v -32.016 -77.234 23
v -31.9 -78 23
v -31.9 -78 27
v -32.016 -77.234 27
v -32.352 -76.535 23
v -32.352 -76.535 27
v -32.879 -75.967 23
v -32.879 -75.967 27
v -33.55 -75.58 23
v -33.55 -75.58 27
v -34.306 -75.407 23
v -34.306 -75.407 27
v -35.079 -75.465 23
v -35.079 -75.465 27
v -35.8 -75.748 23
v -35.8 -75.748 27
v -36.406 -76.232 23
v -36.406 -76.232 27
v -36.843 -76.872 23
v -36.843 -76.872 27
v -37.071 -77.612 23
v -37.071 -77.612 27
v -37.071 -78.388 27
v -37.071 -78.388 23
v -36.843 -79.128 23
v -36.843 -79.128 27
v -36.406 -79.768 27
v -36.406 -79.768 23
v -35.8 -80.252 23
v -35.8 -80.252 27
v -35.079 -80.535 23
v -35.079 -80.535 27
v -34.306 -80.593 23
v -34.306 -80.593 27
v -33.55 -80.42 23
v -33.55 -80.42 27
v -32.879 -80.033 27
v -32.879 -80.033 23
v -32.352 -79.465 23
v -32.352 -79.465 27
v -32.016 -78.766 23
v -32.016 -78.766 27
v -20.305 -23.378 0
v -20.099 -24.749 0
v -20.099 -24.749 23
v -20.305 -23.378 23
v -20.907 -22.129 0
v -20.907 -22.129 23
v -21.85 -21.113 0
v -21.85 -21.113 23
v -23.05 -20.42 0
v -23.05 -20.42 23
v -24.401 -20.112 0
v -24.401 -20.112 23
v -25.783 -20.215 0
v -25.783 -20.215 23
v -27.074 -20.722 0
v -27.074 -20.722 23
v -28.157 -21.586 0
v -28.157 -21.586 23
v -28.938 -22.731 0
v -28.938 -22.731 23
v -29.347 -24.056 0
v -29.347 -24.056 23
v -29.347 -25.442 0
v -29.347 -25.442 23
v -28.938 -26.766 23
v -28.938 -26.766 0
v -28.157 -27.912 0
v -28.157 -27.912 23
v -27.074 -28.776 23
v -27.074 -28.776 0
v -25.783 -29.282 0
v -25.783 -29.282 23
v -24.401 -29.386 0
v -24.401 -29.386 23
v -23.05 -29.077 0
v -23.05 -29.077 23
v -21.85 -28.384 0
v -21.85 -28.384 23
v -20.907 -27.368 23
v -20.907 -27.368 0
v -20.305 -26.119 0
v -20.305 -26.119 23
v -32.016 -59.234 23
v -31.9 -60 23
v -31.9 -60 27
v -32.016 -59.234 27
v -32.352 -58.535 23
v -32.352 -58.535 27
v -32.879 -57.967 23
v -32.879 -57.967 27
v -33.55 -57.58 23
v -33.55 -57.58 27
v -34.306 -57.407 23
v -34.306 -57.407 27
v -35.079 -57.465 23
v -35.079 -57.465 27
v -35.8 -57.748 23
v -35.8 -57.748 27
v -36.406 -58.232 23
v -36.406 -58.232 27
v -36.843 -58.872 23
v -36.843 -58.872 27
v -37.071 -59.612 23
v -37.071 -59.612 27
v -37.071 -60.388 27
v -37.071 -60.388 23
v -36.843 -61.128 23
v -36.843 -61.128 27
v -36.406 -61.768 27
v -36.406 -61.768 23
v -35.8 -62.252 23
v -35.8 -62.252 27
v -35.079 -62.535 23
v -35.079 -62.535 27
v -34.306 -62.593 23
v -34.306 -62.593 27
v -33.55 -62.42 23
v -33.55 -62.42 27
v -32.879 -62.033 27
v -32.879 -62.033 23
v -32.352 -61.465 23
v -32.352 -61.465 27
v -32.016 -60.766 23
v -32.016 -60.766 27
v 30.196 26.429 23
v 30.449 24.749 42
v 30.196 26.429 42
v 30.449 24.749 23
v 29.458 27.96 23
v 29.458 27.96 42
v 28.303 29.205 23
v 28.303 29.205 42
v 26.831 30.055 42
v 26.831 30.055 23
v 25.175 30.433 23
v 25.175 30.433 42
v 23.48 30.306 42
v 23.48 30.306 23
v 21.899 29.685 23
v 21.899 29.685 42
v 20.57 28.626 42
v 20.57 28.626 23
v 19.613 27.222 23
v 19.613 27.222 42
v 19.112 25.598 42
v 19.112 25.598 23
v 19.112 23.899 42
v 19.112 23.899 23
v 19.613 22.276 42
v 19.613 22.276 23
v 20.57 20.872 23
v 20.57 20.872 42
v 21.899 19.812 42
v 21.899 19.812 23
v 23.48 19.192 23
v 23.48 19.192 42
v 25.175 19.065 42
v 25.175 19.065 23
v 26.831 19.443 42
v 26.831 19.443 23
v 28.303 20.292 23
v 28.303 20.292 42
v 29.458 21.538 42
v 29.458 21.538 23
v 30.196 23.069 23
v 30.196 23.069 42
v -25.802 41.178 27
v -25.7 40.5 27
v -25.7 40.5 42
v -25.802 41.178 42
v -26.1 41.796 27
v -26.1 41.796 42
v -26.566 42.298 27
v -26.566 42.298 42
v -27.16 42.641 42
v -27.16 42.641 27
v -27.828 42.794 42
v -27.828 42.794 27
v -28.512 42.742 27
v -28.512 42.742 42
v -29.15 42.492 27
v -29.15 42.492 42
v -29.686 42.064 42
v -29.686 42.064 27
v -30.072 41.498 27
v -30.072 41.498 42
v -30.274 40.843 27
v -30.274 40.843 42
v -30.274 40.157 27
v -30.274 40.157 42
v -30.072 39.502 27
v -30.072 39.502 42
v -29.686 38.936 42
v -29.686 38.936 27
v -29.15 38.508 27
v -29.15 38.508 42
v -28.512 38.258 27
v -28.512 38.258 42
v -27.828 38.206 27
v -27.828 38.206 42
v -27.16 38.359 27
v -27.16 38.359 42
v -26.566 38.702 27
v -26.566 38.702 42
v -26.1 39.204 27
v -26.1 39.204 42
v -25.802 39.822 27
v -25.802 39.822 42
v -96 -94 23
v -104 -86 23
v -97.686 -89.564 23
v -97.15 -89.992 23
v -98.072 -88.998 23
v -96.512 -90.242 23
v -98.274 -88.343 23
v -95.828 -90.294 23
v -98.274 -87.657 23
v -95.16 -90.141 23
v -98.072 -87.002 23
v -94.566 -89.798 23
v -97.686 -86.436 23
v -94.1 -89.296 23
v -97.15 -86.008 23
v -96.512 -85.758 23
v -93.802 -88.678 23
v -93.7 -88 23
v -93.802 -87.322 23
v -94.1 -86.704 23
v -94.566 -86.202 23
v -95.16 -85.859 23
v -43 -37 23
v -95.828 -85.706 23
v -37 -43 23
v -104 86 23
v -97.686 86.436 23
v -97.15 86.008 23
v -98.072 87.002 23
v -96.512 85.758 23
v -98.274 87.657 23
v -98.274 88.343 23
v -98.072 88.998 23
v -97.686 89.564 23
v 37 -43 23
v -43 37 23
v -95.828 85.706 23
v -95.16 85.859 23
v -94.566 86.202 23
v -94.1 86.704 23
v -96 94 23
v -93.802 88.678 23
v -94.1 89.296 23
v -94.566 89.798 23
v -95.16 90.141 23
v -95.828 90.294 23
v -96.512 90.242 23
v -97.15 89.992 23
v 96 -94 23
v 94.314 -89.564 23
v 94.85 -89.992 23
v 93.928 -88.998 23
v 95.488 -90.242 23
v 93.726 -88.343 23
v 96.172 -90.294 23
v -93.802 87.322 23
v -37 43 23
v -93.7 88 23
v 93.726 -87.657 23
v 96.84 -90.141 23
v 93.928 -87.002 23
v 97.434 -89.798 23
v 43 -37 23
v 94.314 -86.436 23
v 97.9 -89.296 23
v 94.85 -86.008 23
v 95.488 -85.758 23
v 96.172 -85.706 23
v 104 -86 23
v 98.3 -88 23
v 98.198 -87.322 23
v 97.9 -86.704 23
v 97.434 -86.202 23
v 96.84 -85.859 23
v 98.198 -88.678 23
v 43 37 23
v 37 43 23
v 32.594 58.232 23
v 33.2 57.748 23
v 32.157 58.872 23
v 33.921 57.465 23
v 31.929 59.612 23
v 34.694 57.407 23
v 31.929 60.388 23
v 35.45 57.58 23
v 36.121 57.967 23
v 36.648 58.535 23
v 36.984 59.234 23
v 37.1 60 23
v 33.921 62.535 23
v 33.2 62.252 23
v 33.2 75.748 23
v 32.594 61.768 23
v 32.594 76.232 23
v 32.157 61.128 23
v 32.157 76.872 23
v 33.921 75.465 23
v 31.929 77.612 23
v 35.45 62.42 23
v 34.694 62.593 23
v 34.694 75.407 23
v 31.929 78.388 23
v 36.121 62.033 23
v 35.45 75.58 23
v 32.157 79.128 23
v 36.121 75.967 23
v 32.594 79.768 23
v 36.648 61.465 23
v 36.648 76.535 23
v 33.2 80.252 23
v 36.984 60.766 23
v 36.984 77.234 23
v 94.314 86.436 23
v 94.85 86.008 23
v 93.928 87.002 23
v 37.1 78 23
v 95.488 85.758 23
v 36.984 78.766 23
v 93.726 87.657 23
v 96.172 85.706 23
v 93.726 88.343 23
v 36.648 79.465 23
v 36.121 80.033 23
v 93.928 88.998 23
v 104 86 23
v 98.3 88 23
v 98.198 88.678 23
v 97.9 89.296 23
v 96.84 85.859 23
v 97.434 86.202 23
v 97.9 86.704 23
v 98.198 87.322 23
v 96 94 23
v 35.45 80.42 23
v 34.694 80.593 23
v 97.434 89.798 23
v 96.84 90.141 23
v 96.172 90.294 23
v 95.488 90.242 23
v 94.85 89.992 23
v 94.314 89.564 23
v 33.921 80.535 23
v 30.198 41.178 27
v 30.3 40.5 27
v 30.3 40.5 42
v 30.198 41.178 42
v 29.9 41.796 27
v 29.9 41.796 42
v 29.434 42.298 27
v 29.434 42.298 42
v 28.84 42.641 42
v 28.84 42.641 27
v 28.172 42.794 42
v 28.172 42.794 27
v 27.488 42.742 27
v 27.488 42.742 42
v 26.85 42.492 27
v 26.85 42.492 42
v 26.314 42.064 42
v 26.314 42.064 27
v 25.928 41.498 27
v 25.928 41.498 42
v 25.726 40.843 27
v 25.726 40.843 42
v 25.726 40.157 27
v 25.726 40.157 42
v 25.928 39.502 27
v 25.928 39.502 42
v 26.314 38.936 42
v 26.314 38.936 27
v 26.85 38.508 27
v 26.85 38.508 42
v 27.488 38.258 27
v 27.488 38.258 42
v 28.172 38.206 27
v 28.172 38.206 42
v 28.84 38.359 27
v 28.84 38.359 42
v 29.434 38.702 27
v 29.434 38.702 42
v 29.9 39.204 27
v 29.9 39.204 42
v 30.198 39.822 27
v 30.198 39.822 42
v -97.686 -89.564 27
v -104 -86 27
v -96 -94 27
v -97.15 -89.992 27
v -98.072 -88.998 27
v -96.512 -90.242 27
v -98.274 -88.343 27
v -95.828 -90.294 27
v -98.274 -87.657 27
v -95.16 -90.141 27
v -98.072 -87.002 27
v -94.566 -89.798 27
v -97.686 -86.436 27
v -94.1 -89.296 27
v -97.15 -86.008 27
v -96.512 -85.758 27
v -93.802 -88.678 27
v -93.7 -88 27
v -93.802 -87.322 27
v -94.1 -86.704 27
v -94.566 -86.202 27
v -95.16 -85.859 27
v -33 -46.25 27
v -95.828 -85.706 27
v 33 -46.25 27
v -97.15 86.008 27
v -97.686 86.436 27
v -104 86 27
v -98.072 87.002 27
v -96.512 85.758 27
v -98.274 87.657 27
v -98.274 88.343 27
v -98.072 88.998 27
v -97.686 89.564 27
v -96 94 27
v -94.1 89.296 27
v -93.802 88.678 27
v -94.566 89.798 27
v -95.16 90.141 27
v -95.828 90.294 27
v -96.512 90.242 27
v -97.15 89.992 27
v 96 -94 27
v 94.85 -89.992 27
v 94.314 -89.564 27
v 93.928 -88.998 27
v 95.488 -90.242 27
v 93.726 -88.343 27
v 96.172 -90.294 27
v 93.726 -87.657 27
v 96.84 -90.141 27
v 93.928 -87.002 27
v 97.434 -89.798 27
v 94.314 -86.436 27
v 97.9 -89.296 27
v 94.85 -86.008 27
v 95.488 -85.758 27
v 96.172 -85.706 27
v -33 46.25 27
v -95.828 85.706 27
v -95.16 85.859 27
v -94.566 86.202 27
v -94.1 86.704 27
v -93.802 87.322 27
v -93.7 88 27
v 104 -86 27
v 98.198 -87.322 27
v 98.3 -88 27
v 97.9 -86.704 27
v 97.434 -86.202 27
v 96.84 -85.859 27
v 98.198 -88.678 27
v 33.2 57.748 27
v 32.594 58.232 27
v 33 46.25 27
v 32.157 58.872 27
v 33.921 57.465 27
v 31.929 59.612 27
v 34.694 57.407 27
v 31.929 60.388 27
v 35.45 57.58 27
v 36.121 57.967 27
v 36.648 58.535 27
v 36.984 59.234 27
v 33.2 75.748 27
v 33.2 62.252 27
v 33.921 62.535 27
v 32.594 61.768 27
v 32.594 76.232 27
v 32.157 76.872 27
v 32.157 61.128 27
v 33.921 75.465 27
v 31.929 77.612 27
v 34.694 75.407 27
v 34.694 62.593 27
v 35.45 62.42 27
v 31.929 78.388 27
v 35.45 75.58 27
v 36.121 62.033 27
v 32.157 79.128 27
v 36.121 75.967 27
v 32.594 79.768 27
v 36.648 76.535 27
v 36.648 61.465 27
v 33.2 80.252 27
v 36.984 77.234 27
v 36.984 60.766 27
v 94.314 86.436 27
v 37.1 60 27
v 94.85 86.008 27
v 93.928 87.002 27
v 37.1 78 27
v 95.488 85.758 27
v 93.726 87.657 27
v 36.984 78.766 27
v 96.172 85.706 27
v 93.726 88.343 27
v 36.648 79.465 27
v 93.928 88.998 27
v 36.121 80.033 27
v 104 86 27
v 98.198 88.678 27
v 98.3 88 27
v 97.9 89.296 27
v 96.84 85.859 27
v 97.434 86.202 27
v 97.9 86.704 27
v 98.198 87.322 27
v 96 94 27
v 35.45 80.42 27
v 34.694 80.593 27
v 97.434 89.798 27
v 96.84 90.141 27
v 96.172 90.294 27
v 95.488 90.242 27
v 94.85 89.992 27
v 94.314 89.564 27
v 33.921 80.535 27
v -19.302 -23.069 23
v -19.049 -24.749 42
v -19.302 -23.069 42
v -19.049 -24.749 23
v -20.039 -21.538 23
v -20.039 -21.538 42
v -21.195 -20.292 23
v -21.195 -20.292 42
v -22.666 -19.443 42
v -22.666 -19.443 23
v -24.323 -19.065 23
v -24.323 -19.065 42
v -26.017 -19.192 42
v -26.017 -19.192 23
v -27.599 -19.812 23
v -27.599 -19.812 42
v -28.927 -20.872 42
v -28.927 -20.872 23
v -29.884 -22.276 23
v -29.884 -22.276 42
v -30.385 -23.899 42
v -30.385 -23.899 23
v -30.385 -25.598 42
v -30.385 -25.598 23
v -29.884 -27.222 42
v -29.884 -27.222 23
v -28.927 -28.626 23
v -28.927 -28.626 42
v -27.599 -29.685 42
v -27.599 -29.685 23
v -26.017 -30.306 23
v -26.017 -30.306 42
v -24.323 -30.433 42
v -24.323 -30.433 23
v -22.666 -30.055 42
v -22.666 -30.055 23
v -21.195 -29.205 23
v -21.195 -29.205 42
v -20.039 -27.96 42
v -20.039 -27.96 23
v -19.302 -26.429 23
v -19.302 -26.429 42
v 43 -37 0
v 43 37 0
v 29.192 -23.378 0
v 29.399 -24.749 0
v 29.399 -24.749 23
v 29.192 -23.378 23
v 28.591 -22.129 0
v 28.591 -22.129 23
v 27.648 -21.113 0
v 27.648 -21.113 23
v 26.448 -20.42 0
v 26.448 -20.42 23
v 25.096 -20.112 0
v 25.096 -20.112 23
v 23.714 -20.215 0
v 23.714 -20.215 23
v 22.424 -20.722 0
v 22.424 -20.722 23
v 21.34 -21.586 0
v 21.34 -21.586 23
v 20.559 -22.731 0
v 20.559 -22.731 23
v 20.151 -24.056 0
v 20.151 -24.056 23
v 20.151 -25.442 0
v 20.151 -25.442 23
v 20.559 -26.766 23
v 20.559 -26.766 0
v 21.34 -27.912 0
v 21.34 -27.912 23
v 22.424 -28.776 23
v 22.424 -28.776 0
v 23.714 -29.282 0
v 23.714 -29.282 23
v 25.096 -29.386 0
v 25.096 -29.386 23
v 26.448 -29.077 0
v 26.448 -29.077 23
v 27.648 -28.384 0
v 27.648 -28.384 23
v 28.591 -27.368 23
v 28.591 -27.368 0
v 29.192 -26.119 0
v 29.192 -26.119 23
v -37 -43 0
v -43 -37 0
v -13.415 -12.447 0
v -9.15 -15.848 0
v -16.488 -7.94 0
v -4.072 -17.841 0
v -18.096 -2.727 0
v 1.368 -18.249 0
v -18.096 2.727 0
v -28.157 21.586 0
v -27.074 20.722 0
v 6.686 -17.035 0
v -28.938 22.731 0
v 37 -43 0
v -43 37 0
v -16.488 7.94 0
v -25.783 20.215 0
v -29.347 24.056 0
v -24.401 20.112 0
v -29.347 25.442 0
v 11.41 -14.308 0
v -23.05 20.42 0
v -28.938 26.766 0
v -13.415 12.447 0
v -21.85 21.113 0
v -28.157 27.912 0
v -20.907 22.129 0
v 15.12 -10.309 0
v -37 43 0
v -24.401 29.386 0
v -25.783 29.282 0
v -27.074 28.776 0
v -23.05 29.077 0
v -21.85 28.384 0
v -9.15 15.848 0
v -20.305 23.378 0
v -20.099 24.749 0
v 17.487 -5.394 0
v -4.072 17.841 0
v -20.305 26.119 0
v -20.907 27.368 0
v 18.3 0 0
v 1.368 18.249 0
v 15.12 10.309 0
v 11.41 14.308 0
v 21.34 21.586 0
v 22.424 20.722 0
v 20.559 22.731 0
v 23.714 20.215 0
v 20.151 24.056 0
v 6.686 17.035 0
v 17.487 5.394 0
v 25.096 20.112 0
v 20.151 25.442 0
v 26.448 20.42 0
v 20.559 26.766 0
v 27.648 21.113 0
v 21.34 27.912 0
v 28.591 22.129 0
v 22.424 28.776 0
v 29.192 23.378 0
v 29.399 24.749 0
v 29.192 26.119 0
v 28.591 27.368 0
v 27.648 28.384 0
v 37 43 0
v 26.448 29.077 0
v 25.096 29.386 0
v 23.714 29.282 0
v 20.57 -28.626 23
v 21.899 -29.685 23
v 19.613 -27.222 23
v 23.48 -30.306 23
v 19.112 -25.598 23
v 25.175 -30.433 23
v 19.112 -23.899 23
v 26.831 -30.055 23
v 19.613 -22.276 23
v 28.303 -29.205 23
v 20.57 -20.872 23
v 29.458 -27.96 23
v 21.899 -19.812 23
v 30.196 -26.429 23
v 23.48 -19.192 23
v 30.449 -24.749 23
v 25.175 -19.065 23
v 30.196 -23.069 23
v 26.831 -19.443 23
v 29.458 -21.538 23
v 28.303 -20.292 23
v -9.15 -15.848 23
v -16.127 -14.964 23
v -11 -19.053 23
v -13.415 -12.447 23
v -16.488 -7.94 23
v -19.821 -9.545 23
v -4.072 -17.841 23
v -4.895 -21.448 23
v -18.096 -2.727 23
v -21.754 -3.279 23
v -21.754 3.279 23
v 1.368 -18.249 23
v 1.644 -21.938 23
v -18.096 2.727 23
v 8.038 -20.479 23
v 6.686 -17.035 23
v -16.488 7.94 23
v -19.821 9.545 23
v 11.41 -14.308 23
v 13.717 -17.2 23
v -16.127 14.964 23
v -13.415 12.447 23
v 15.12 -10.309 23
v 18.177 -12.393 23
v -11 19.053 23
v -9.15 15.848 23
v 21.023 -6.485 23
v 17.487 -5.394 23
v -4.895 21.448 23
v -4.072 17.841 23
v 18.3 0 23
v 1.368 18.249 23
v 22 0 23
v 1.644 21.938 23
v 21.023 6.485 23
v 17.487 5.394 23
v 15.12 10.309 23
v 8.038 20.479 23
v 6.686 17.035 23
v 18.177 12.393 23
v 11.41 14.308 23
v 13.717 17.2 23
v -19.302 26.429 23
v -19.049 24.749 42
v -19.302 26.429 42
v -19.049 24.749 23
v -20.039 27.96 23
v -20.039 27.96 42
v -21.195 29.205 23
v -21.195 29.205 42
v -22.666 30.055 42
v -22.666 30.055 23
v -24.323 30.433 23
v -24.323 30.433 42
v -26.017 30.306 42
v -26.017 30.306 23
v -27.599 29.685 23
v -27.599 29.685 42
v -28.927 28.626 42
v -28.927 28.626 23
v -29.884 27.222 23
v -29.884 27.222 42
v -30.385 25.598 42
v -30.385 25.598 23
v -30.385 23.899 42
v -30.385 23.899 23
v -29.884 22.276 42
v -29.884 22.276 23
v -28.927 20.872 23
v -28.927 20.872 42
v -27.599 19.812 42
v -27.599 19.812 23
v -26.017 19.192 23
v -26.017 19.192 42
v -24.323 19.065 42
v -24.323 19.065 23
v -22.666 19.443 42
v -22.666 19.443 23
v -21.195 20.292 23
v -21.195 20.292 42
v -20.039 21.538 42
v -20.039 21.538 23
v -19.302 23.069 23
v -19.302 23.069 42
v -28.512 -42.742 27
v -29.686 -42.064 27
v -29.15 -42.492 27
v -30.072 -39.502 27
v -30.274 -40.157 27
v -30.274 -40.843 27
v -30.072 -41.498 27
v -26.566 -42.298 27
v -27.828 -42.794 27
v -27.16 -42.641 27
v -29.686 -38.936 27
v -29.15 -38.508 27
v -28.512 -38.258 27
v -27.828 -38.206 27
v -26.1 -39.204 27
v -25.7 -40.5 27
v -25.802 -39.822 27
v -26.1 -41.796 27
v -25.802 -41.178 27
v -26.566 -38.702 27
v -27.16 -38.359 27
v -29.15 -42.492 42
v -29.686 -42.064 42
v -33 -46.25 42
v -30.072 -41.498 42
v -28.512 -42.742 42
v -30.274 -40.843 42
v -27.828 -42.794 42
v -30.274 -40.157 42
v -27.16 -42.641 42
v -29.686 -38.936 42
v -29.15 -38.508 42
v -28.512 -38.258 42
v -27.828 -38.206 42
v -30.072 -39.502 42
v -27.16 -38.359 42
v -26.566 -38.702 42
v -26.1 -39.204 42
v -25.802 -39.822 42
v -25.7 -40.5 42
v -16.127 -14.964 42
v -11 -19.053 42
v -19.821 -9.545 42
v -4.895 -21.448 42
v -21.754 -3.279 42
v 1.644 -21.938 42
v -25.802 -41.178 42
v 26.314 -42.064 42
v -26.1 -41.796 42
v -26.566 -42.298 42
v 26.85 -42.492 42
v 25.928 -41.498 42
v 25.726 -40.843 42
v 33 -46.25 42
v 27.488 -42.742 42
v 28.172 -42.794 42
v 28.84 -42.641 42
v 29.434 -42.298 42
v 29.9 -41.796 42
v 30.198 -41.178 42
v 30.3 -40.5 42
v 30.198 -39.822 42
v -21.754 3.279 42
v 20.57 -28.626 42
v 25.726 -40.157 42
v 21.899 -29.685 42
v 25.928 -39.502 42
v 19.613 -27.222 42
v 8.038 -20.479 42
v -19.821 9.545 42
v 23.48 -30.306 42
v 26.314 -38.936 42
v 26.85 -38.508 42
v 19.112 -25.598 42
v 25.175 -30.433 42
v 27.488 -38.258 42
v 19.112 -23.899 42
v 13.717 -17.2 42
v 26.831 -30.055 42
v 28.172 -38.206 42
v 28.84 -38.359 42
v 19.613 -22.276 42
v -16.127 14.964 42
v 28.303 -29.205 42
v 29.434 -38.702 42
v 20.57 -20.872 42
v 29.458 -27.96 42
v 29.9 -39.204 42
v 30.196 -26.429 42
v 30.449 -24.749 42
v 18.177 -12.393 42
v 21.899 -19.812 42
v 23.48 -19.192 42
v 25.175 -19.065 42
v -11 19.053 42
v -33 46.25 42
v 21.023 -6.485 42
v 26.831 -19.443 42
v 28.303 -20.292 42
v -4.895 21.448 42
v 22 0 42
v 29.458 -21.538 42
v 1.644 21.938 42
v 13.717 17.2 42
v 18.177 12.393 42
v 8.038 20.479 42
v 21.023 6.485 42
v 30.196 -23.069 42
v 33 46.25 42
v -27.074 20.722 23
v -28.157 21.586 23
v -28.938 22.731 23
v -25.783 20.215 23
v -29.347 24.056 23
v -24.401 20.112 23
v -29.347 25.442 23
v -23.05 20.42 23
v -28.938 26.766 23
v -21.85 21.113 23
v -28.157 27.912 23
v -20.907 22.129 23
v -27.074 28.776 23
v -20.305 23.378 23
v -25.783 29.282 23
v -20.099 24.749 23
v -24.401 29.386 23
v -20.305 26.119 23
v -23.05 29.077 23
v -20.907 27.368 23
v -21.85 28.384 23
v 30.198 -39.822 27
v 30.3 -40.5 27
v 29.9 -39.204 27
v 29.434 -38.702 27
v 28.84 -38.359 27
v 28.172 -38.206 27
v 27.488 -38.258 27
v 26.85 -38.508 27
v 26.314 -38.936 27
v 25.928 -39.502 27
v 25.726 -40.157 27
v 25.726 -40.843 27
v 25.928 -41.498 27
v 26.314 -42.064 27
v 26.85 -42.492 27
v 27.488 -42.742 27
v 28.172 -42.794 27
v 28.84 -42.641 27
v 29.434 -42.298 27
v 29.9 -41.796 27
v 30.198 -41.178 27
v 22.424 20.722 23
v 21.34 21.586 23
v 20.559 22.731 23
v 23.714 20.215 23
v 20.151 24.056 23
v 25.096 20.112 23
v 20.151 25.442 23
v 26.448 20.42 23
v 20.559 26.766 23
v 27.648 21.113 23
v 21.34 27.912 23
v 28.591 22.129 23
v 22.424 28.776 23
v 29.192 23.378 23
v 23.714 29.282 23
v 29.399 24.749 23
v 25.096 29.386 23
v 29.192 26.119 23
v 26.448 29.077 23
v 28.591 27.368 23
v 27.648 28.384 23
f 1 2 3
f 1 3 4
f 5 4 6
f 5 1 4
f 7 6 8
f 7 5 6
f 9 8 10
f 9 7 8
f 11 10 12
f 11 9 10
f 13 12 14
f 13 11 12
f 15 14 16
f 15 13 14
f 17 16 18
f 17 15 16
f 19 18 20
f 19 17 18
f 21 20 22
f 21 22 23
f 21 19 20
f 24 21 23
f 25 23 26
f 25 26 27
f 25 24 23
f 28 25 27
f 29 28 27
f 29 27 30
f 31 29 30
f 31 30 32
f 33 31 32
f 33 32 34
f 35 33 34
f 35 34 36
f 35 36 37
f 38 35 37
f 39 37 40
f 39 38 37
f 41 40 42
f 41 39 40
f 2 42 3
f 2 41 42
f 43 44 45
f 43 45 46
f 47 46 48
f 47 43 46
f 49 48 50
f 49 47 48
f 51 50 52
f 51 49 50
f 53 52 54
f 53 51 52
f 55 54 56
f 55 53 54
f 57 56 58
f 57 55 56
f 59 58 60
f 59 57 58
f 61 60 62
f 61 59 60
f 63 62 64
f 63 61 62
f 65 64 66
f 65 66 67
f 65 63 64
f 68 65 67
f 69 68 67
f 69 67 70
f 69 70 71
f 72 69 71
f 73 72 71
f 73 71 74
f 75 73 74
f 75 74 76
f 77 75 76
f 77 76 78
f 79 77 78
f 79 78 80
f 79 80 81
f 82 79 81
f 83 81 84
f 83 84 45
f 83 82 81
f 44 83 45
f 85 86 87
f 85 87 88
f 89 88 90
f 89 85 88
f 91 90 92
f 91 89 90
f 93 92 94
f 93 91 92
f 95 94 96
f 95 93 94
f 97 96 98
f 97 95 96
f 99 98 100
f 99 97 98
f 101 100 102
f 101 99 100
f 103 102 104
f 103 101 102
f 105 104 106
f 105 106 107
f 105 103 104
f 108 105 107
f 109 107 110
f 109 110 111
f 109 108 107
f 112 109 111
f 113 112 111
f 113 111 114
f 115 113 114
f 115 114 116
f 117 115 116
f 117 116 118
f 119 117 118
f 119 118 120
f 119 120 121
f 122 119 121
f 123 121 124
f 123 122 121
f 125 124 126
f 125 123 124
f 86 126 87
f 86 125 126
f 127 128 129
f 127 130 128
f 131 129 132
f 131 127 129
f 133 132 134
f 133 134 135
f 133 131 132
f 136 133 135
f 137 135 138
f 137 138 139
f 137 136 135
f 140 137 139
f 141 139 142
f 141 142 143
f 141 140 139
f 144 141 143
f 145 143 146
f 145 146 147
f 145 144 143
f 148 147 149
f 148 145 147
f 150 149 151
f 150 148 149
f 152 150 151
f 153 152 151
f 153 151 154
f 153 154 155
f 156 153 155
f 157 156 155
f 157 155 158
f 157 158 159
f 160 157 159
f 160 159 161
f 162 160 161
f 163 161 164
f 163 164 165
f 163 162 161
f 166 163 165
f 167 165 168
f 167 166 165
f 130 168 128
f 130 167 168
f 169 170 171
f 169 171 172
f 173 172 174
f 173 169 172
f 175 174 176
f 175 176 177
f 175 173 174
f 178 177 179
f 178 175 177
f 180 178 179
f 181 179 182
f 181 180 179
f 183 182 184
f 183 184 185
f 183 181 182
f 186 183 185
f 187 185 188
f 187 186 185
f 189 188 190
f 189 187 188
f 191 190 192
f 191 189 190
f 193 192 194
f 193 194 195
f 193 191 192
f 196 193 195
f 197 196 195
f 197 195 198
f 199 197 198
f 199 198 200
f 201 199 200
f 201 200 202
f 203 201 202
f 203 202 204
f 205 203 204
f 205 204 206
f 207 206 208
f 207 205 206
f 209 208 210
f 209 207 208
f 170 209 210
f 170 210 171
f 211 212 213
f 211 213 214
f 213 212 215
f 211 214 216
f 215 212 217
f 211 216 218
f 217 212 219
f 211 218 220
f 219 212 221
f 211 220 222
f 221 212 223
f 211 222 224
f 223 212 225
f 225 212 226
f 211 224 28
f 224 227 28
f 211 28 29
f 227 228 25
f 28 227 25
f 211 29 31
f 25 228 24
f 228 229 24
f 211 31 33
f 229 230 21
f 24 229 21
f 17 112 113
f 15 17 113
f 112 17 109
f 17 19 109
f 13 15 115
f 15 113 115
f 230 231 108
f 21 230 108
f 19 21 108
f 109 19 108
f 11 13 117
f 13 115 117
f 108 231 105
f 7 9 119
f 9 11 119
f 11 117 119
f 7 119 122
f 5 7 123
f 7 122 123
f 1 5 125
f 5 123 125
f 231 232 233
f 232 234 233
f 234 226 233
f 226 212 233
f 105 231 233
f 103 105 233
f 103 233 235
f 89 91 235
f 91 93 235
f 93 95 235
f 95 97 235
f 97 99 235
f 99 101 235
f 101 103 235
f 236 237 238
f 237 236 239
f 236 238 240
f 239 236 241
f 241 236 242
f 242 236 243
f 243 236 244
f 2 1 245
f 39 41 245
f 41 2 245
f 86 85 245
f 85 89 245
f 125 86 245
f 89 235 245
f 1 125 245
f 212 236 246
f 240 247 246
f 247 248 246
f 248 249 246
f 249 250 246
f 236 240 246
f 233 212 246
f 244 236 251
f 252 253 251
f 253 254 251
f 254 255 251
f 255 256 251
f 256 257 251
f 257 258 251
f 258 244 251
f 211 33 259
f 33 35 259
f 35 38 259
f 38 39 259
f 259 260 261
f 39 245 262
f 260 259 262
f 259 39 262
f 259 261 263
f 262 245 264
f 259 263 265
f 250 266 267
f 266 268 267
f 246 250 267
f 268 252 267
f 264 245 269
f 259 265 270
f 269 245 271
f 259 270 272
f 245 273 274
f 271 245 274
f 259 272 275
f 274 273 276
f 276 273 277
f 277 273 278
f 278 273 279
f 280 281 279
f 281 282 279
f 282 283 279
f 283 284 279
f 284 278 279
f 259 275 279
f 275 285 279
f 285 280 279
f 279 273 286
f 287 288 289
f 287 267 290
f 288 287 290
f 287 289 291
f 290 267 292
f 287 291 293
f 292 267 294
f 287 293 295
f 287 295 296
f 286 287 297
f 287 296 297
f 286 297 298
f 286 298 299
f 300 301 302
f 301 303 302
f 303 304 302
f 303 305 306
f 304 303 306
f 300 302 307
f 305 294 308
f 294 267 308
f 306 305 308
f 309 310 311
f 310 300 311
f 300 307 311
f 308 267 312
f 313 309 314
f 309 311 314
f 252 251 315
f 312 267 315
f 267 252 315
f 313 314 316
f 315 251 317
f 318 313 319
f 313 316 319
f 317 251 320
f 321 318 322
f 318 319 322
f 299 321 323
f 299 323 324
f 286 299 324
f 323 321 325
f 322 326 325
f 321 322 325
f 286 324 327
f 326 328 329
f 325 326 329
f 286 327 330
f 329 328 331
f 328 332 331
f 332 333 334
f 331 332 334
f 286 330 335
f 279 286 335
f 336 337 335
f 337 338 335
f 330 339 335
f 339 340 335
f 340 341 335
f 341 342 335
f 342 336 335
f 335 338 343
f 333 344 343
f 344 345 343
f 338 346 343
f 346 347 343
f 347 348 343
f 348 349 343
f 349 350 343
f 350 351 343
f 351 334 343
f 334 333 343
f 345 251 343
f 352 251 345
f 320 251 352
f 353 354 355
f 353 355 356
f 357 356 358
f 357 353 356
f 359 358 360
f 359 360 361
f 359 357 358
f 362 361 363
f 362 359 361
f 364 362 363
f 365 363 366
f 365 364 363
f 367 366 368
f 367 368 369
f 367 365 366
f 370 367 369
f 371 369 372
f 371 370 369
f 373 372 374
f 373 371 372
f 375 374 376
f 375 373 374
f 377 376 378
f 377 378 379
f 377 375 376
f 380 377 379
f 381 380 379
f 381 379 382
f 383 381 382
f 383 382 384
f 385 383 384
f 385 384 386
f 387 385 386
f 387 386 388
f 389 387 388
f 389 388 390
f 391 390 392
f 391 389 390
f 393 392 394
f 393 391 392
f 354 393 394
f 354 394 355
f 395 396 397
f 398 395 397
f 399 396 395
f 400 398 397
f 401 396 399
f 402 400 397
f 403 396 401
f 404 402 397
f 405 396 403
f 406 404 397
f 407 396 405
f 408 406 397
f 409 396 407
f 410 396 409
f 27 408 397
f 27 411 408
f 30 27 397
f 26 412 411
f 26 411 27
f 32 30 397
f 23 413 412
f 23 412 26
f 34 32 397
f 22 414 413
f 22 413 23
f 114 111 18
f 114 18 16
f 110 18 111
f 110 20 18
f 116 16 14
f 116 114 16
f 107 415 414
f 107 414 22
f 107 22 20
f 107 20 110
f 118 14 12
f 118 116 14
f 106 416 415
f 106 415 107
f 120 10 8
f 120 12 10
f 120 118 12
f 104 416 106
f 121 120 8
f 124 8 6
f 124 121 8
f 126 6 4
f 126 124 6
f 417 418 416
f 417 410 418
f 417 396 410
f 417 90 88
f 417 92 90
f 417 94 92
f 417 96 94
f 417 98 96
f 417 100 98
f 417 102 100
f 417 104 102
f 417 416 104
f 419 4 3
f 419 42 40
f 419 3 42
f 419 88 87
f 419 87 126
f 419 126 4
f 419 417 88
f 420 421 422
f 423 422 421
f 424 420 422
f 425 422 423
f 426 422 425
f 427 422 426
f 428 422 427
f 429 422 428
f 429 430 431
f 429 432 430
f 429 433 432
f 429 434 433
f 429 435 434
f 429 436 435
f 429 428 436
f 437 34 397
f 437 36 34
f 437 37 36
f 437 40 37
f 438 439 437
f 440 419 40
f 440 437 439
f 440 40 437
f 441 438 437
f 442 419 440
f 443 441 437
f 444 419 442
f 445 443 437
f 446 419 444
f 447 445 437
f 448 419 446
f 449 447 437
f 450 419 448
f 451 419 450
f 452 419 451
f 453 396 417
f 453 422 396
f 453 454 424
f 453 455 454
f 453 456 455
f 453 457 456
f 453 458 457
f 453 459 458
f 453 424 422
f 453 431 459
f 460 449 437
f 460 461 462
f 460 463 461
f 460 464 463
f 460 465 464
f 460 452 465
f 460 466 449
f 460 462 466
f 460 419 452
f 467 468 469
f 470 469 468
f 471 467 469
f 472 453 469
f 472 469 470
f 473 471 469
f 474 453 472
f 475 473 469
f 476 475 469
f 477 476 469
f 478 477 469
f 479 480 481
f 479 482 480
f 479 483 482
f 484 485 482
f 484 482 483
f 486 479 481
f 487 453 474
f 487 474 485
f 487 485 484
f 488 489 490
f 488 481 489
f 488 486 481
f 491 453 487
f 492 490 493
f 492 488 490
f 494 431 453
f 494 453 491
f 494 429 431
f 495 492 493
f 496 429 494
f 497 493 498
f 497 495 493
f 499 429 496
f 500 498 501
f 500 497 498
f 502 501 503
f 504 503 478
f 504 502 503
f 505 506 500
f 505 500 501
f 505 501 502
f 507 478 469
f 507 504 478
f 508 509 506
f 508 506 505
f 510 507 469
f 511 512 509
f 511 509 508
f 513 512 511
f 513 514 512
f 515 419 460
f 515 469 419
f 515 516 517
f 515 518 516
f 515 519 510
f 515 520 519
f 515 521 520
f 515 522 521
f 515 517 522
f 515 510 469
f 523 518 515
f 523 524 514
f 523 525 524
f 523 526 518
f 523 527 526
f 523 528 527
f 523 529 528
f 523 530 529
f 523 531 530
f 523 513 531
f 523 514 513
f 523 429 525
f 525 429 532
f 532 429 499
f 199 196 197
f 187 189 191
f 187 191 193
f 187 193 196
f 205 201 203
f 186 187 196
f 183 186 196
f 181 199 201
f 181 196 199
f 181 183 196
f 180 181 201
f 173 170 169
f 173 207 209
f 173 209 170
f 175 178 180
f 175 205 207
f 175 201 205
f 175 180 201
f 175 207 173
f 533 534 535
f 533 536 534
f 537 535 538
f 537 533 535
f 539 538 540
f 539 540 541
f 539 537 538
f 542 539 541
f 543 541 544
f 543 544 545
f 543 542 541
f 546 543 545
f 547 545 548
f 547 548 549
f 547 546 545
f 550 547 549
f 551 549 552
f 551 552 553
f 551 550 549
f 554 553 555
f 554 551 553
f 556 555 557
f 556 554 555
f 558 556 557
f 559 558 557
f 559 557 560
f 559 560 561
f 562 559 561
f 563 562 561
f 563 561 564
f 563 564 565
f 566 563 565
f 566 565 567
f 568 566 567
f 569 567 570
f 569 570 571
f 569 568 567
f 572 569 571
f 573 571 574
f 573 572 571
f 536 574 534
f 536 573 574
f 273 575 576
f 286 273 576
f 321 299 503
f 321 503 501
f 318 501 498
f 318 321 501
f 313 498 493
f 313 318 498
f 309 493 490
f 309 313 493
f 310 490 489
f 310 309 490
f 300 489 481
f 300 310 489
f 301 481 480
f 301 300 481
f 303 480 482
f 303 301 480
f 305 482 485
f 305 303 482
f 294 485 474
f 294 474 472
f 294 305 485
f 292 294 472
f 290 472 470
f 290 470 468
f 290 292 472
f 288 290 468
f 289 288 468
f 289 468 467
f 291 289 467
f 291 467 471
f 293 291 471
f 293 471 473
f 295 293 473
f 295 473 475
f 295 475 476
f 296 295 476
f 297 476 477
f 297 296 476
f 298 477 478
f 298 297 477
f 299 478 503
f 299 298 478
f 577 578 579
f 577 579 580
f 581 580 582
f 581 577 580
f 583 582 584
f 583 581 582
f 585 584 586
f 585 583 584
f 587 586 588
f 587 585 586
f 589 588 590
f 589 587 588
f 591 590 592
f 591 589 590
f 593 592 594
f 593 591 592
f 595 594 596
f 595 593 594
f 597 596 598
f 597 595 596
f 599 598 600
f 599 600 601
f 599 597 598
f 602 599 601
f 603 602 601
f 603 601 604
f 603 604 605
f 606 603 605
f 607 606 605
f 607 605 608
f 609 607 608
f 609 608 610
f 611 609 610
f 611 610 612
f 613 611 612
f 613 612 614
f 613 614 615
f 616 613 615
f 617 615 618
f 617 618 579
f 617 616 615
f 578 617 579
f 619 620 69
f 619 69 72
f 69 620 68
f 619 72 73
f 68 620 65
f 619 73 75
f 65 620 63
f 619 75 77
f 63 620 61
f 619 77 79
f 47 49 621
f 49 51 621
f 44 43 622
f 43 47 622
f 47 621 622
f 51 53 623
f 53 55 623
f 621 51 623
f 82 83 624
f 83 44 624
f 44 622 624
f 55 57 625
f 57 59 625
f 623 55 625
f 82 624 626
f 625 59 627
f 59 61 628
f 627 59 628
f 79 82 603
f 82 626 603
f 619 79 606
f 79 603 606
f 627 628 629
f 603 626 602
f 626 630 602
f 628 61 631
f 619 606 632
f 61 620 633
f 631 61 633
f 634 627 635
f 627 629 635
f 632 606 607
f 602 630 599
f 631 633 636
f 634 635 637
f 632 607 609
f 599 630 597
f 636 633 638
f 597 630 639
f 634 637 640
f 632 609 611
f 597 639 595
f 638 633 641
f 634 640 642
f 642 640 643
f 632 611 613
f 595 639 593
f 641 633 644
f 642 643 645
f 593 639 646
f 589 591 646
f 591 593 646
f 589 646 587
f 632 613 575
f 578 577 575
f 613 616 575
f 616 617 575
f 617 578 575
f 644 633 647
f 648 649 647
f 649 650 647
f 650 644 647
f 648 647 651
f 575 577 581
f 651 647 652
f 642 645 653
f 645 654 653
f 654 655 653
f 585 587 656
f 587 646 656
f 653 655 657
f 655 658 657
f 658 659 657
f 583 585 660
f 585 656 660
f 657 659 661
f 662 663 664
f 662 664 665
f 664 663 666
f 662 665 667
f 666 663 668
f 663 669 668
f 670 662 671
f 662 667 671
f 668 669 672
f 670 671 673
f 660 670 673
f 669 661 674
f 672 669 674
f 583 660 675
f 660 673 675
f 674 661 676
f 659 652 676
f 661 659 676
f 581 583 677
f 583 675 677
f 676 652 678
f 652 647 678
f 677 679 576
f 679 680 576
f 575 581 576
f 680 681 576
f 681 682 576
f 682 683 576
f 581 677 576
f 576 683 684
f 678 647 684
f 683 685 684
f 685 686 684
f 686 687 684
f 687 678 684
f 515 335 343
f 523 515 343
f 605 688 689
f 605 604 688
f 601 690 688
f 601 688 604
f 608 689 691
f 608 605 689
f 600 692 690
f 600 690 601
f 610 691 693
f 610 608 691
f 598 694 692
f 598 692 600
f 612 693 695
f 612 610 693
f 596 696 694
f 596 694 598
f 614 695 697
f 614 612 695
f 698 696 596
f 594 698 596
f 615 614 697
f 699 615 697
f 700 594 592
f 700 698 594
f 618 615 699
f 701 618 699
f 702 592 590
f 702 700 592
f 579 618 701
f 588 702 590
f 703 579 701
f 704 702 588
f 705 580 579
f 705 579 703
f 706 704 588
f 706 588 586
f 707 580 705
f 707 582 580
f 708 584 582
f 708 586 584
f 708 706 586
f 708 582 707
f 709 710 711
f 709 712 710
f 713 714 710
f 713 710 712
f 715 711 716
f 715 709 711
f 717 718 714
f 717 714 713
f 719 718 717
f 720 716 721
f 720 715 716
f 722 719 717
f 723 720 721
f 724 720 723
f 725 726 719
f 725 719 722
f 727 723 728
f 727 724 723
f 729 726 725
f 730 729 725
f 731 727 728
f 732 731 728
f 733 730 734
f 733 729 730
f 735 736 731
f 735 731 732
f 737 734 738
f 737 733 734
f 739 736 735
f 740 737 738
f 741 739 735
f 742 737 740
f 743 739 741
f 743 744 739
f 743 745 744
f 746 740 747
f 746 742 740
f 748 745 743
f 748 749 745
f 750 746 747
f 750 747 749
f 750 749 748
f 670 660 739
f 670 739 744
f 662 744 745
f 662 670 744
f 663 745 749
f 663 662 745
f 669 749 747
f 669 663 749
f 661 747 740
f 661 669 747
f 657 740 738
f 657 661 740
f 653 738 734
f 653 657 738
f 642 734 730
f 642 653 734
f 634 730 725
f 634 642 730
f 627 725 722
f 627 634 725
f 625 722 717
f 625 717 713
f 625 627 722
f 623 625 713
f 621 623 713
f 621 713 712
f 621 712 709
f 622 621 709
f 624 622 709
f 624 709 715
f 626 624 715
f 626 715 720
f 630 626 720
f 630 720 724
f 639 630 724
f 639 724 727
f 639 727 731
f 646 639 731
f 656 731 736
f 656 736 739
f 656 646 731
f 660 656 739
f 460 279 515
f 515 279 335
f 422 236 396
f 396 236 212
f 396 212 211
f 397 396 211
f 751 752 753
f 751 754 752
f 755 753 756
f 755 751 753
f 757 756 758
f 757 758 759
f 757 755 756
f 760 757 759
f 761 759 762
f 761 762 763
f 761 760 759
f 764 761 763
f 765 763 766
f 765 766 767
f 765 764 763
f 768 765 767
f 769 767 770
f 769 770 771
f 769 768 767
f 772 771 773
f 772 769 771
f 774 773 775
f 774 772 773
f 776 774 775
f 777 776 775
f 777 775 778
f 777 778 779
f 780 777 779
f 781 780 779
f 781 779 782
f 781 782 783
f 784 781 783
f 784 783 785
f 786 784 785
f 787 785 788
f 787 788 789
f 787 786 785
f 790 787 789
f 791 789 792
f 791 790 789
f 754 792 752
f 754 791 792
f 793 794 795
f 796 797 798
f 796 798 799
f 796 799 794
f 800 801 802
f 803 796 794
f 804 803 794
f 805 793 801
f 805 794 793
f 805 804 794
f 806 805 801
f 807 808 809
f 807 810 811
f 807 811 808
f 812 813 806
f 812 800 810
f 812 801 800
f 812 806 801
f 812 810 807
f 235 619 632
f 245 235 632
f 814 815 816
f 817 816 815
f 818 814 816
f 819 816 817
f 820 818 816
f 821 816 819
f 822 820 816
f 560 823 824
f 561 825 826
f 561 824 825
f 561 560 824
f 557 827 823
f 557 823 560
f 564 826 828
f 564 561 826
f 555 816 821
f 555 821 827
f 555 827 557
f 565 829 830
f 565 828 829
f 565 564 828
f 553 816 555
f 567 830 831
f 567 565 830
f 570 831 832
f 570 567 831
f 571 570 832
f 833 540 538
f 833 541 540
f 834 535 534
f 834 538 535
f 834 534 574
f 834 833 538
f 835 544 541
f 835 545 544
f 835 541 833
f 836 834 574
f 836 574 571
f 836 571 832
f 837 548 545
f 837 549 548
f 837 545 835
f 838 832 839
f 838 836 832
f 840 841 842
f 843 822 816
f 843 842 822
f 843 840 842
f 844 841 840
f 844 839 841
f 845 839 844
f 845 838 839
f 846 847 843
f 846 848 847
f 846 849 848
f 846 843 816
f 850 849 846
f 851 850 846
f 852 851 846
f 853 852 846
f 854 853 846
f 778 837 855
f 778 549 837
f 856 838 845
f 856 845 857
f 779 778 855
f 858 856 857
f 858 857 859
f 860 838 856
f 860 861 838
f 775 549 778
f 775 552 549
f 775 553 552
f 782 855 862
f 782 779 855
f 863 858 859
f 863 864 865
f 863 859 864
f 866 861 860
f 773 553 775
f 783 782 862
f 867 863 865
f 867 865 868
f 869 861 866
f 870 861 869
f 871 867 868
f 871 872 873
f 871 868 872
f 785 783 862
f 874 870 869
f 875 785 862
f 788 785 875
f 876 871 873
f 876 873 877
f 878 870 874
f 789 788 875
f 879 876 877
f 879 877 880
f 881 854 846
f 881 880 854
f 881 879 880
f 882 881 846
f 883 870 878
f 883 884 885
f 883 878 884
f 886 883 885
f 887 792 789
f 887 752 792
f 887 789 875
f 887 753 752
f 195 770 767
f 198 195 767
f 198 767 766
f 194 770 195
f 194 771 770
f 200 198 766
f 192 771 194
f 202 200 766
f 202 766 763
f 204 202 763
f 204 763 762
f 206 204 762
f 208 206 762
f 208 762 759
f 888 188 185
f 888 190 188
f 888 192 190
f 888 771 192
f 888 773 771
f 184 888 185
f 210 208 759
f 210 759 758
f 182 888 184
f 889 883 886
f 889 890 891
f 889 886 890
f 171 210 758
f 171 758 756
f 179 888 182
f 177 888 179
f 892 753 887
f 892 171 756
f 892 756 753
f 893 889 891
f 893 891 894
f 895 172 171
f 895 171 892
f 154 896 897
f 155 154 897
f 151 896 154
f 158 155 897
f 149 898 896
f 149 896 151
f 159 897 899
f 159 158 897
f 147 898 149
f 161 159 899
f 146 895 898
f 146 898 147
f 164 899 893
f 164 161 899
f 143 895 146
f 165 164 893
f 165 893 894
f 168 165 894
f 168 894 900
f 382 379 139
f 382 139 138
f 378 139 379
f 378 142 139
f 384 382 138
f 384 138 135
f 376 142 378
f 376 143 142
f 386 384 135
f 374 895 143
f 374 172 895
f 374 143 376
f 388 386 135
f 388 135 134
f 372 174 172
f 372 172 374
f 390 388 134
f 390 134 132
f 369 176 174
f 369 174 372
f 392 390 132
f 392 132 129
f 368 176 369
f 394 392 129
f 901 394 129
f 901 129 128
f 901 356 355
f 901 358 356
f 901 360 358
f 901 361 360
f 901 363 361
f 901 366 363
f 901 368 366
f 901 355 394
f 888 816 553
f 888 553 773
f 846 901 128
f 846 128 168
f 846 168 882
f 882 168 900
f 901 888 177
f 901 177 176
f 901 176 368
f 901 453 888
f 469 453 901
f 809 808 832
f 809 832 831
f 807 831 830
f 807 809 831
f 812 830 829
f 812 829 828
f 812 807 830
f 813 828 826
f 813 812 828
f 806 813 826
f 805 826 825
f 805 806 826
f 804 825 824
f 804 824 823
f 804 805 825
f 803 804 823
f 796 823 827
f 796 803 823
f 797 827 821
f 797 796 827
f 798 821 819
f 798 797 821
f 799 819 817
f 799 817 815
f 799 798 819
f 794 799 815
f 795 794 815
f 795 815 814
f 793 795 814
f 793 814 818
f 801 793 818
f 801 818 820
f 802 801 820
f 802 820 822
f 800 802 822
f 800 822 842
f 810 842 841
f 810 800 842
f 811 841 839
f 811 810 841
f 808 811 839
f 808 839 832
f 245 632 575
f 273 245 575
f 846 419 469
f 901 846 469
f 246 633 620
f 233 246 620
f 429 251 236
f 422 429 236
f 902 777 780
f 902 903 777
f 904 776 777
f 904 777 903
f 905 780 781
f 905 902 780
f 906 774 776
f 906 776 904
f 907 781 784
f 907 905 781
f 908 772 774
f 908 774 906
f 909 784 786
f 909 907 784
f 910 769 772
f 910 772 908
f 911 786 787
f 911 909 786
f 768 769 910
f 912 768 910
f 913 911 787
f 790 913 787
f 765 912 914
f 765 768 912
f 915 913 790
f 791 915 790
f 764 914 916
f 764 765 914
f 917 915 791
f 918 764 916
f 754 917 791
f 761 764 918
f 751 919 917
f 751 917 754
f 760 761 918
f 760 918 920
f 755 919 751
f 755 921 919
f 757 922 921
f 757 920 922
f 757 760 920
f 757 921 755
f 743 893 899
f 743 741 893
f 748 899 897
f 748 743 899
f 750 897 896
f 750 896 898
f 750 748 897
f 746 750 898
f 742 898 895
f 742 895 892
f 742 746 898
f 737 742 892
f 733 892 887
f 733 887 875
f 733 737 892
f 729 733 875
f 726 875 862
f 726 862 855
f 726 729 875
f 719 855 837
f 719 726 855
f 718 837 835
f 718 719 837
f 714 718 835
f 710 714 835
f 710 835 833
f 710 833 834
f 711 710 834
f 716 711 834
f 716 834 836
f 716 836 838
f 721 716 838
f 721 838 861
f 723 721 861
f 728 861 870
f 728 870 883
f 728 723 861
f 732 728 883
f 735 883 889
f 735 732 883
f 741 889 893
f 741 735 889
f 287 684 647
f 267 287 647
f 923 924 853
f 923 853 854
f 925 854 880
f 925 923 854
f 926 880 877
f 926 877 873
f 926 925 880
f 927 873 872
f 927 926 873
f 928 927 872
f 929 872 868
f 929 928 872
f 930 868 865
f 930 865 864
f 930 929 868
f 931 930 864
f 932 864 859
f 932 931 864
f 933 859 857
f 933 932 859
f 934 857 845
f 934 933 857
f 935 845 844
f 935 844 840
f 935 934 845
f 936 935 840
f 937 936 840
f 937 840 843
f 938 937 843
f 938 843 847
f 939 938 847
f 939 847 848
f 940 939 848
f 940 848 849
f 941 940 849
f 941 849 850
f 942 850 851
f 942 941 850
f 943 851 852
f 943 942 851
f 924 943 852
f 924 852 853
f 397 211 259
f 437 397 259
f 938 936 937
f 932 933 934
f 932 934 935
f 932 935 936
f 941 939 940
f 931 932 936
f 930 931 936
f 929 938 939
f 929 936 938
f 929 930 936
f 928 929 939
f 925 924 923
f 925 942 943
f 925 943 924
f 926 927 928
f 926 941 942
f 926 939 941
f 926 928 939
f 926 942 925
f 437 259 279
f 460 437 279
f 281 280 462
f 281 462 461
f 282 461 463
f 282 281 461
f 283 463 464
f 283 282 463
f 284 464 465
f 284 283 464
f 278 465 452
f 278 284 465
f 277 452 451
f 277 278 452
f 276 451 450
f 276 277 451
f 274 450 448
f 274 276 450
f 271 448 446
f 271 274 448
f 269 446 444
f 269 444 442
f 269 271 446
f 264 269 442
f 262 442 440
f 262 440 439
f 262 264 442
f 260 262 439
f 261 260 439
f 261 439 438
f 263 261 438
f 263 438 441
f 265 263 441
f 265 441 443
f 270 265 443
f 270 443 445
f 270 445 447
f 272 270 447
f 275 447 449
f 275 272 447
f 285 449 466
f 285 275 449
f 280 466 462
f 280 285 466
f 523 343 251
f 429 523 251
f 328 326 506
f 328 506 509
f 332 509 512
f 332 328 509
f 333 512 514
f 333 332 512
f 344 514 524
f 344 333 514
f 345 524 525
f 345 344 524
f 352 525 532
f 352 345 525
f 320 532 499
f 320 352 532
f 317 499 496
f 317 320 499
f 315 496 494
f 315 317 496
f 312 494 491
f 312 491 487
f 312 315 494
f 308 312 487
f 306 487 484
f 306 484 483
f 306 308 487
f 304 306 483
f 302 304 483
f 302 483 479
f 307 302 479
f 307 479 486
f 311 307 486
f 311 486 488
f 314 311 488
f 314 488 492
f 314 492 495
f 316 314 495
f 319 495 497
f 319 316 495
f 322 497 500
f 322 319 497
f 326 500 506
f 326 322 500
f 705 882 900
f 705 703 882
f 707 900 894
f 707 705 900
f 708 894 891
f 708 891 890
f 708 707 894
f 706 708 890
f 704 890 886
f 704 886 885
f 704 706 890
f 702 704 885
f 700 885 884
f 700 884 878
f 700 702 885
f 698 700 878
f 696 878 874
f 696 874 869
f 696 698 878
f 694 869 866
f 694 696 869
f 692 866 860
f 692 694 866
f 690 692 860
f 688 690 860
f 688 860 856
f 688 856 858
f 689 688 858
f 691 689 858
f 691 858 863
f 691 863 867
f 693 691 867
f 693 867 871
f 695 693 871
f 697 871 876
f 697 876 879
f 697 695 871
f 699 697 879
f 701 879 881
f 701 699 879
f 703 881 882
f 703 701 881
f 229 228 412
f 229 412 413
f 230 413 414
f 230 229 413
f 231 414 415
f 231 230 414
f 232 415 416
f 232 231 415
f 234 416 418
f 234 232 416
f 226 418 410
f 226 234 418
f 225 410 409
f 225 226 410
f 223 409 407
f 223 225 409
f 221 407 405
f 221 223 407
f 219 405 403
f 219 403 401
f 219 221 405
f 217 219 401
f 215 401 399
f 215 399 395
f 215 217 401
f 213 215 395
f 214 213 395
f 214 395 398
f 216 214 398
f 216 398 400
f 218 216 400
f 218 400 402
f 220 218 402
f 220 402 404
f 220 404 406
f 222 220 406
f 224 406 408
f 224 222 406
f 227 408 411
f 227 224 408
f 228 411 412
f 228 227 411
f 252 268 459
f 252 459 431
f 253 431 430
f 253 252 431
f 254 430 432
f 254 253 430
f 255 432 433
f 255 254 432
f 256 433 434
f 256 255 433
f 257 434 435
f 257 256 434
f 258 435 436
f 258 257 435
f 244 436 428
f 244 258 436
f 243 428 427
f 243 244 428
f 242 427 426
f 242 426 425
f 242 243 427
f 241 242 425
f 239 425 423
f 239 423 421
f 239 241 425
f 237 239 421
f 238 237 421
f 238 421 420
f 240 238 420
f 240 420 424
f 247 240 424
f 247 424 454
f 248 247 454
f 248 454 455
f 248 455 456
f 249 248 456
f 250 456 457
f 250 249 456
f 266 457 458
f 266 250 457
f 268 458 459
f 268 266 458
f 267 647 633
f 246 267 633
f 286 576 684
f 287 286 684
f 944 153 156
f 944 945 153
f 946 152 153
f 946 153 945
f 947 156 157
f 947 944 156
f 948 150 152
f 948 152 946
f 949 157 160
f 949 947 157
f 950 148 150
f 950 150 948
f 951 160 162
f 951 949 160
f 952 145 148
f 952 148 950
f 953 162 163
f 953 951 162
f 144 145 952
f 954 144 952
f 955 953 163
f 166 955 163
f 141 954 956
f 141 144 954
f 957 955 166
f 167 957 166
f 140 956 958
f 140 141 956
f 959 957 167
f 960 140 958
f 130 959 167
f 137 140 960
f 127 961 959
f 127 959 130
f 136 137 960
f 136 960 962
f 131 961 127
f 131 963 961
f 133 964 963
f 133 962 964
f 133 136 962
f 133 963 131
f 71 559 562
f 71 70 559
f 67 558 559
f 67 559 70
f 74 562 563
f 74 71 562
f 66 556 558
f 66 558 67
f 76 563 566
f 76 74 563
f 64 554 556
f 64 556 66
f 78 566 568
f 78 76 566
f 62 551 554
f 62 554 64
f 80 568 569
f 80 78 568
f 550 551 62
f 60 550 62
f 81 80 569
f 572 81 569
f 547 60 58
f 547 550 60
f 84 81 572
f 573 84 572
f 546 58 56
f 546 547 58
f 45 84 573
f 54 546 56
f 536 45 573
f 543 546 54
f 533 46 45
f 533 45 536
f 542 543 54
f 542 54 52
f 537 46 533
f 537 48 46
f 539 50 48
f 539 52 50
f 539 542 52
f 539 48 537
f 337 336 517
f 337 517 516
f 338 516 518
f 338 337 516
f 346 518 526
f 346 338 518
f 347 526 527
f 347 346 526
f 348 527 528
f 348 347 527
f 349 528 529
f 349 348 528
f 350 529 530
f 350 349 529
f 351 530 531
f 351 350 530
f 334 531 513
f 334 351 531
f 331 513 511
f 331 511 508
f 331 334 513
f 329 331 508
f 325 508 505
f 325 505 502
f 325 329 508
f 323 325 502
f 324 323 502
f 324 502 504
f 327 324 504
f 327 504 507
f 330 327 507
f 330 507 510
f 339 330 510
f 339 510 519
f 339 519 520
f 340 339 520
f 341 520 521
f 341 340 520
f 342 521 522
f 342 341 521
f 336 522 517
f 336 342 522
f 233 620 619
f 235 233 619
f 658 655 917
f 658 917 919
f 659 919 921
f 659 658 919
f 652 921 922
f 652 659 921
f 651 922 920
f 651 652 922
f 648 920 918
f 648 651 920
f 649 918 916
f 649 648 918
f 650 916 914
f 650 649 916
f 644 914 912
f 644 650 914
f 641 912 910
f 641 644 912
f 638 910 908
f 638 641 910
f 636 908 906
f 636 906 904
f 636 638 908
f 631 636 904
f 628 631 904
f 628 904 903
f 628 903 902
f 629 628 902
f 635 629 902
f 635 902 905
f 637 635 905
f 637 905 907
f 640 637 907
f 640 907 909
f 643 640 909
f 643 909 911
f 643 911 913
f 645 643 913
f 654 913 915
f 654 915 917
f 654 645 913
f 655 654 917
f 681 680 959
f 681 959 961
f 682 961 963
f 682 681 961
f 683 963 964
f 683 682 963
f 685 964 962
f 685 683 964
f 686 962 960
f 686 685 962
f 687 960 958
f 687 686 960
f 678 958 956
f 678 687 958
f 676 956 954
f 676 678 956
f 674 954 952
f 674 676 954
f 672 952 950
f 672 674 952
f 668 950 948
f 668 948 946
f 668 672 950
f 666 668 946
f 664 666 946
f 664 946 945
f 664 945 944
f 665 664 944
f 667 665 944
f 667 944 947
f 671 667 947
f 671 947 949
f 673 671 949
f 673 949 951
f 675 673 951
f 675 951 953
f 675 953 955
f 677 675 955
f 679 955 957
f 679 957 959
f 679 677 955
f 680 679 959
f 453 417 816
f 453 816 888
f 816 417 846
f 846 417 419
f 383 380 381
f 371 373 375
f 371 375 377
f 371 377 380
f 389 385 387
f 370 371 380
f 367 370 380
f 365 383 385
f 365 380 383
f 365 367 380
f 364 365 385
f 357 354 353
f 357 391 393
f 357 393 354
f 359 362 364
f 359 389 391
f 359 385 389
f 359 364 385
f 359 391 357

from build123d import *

# Parameters (mm, degrees)
SKETCH1_R                                      = 18.3
SKETCH1_R_2                                    = 4.65
INTEGRAL_HOLT_FLANGE_AND_STEM_CAVITY_DEPTH     = 23
SHARED_START                                   = 23
SKETCH2_R                                      = 22
SKETCH2_R_2                                    = 5.7
SKETCH2_R_3                                    = 2.3
SKETCH2_R_4                                    = 2.6
SHARED_FLAT_LOAD_PLATE_FOR_BOTH_CYLINDER_DEPTH = 4
LOWER_START                                    = 27
SKETCH3_W                                      = 66
SKETCH3_H                                      = 92.5
SKETCH3_R                                      = 22
SKETCH3_R_2                                    = 5.7
SKETCH3_R_3                                    = 2.3
LOWER_BEARING_AND_GUIDE_REGISTER_DEPTH         = 15


with BuildPart() as part:
    # Sketch1 → Integral HOLT flange and stem cavity (new body)
    with BuildSketch(Plane.XY):
        Polygon((-37, -43), (37, -43), (43, -37), (43, 37), (37, 43), (-37, 43), (-43, 37), (-43, -37), align=None)
        Circle(SKETCH1_R, mode=Mode.SUBTRACT)
        with Locations((-24.748737, -24.748737)):
            Circle(SKETCH1_R_2, mode=Mode.SUBTRACT)
        with Locations((-24.748737, 24.748737)):
            Circle(SKETCH1_R_2, mode=Mode.SUBTRACT)
        with Locations((24.748737, -24.748737)):
            Circle(SKETCH1_R_2, mode=Mode.SUBTRACT)
        with Locations((24.748737, 24.748737)):
            Circle(SKETCH1_R_2, mode=Mode.SUBTRACT)
    extrude(amount=INTEGRAL_HOLT_FLANGE_AND_STEM_CAVITY_DEPTH)

    # Sketch2 → Shared flat load plate for both cylinder mounts (add)
    with BuildSketch(Plane.XY.offset(SHARED_START)):
        Polygon((-96, -94), (96, -94), (104, -86), (104, 86), (96, 94), (-96, 94), (-104, 86), (-104, -86), align=None)
        Circle(SKETCH2_R, mode=Mode.SUBTRACT)
        with Locations((-24.748737, -24.748737)):
            Circle(SKETCH2_R_2, mode=Mode.SUBTRACT)
        with Locations((-24.748737, 24.748737)):
            Circle(SKETCH2_R_2, mode=Mode.SUBTRACT)
        with Locations((24.748737, -24.748737)):
            Circle(SKETCH2_R_2, mode=Mode.SUBTRACT)
        with Locations((24.748737, 24.748737)):
            Circle(SKETCH2_R_2, mode=Mode.SUBTRACT)
        with Locations((-96, -88)):
            Circle(SKETCH2_R_3, mode=Mode.SUBTRACT)
        with Locations((-96, 88)):
            Circle(SKETCH2_R_3, mode=Mode.SUBTRACT)
        with Locations((96, -88)):
            Circle(SKETCH2_R_3, mode=Mode.SUBTRACT)
        with Locations((96, 88)):
            Circle(SKETCH2_R_3, mode=Mode.SUBTRACT)
        with Locations((34.5, 60)):
            Circle(SKETCH2_R_4, mode=Mode.SUBTRACT)
        with Locations((34.5, 78)):
            Circle(SKETCH2_R_4, mode=Mode.SUBTRACT)
        with Locations((-34.5, -60)):
            Circle(SKETCH2_R_4, mode=Mode.SUBTRACT)
        with Locations((-34.5, -78)):
            Circle(SKETCH2_R_4, mode=Mode.SUBTRACT)
    extrude(amount=SHARED_FLAT_LOAD_PLATE_FOR_BOTH_CYLINDER_DEPTH)

    # Sketch3 → Lower bearing and guide register (add)
    with BuildSketch(Plane.XY.offset(LOWER_START)):
        Rectangle(SKETCH3_W, SKETCH3_H)
        Circle(SKETCH3_R, mode=Mode.SUBTRACT)
        with Locations((-24.748737, -24.748737)):
            Circle(SKETCH3_R_2, mode=Mode.SUBTRACT)
        with Locations((-24.748737, 24.748737)):
            Circle(SKETCH3_R_2, mode=Mode.SUBTRACT)
        with Locations((24.748737, -24.748737)):
            Circle(SKETCH3_R_2, mode=Mode.SUBTRACT)
        with Locations((24.748737, 24.748737)):
            Circle(SKETCH3_R_2, mode=Mode.SUBTRACT)
        with Locations((-28, -40.5)):
            Circle(SKETCH3_R_3, mode=Mode.SUBTRACT)
        with Locations((-28, 40.5)):
            Circle(SKETCH3_R_3, mode=Mode.SUBTRACT)
        with Locations((28, -40.5)):
            Circle(SKETCH3_R_3, mode=Mode.SUBTRACT)
        with Locations((28, 40.5)):
            Circle(SKETCH3_R_3, mode=Mode.SUBTRACT)
    extrude(amount=LOWER_BEARING_AND_GUIDE_REGISTER_DEPTH)


solid = part.part
